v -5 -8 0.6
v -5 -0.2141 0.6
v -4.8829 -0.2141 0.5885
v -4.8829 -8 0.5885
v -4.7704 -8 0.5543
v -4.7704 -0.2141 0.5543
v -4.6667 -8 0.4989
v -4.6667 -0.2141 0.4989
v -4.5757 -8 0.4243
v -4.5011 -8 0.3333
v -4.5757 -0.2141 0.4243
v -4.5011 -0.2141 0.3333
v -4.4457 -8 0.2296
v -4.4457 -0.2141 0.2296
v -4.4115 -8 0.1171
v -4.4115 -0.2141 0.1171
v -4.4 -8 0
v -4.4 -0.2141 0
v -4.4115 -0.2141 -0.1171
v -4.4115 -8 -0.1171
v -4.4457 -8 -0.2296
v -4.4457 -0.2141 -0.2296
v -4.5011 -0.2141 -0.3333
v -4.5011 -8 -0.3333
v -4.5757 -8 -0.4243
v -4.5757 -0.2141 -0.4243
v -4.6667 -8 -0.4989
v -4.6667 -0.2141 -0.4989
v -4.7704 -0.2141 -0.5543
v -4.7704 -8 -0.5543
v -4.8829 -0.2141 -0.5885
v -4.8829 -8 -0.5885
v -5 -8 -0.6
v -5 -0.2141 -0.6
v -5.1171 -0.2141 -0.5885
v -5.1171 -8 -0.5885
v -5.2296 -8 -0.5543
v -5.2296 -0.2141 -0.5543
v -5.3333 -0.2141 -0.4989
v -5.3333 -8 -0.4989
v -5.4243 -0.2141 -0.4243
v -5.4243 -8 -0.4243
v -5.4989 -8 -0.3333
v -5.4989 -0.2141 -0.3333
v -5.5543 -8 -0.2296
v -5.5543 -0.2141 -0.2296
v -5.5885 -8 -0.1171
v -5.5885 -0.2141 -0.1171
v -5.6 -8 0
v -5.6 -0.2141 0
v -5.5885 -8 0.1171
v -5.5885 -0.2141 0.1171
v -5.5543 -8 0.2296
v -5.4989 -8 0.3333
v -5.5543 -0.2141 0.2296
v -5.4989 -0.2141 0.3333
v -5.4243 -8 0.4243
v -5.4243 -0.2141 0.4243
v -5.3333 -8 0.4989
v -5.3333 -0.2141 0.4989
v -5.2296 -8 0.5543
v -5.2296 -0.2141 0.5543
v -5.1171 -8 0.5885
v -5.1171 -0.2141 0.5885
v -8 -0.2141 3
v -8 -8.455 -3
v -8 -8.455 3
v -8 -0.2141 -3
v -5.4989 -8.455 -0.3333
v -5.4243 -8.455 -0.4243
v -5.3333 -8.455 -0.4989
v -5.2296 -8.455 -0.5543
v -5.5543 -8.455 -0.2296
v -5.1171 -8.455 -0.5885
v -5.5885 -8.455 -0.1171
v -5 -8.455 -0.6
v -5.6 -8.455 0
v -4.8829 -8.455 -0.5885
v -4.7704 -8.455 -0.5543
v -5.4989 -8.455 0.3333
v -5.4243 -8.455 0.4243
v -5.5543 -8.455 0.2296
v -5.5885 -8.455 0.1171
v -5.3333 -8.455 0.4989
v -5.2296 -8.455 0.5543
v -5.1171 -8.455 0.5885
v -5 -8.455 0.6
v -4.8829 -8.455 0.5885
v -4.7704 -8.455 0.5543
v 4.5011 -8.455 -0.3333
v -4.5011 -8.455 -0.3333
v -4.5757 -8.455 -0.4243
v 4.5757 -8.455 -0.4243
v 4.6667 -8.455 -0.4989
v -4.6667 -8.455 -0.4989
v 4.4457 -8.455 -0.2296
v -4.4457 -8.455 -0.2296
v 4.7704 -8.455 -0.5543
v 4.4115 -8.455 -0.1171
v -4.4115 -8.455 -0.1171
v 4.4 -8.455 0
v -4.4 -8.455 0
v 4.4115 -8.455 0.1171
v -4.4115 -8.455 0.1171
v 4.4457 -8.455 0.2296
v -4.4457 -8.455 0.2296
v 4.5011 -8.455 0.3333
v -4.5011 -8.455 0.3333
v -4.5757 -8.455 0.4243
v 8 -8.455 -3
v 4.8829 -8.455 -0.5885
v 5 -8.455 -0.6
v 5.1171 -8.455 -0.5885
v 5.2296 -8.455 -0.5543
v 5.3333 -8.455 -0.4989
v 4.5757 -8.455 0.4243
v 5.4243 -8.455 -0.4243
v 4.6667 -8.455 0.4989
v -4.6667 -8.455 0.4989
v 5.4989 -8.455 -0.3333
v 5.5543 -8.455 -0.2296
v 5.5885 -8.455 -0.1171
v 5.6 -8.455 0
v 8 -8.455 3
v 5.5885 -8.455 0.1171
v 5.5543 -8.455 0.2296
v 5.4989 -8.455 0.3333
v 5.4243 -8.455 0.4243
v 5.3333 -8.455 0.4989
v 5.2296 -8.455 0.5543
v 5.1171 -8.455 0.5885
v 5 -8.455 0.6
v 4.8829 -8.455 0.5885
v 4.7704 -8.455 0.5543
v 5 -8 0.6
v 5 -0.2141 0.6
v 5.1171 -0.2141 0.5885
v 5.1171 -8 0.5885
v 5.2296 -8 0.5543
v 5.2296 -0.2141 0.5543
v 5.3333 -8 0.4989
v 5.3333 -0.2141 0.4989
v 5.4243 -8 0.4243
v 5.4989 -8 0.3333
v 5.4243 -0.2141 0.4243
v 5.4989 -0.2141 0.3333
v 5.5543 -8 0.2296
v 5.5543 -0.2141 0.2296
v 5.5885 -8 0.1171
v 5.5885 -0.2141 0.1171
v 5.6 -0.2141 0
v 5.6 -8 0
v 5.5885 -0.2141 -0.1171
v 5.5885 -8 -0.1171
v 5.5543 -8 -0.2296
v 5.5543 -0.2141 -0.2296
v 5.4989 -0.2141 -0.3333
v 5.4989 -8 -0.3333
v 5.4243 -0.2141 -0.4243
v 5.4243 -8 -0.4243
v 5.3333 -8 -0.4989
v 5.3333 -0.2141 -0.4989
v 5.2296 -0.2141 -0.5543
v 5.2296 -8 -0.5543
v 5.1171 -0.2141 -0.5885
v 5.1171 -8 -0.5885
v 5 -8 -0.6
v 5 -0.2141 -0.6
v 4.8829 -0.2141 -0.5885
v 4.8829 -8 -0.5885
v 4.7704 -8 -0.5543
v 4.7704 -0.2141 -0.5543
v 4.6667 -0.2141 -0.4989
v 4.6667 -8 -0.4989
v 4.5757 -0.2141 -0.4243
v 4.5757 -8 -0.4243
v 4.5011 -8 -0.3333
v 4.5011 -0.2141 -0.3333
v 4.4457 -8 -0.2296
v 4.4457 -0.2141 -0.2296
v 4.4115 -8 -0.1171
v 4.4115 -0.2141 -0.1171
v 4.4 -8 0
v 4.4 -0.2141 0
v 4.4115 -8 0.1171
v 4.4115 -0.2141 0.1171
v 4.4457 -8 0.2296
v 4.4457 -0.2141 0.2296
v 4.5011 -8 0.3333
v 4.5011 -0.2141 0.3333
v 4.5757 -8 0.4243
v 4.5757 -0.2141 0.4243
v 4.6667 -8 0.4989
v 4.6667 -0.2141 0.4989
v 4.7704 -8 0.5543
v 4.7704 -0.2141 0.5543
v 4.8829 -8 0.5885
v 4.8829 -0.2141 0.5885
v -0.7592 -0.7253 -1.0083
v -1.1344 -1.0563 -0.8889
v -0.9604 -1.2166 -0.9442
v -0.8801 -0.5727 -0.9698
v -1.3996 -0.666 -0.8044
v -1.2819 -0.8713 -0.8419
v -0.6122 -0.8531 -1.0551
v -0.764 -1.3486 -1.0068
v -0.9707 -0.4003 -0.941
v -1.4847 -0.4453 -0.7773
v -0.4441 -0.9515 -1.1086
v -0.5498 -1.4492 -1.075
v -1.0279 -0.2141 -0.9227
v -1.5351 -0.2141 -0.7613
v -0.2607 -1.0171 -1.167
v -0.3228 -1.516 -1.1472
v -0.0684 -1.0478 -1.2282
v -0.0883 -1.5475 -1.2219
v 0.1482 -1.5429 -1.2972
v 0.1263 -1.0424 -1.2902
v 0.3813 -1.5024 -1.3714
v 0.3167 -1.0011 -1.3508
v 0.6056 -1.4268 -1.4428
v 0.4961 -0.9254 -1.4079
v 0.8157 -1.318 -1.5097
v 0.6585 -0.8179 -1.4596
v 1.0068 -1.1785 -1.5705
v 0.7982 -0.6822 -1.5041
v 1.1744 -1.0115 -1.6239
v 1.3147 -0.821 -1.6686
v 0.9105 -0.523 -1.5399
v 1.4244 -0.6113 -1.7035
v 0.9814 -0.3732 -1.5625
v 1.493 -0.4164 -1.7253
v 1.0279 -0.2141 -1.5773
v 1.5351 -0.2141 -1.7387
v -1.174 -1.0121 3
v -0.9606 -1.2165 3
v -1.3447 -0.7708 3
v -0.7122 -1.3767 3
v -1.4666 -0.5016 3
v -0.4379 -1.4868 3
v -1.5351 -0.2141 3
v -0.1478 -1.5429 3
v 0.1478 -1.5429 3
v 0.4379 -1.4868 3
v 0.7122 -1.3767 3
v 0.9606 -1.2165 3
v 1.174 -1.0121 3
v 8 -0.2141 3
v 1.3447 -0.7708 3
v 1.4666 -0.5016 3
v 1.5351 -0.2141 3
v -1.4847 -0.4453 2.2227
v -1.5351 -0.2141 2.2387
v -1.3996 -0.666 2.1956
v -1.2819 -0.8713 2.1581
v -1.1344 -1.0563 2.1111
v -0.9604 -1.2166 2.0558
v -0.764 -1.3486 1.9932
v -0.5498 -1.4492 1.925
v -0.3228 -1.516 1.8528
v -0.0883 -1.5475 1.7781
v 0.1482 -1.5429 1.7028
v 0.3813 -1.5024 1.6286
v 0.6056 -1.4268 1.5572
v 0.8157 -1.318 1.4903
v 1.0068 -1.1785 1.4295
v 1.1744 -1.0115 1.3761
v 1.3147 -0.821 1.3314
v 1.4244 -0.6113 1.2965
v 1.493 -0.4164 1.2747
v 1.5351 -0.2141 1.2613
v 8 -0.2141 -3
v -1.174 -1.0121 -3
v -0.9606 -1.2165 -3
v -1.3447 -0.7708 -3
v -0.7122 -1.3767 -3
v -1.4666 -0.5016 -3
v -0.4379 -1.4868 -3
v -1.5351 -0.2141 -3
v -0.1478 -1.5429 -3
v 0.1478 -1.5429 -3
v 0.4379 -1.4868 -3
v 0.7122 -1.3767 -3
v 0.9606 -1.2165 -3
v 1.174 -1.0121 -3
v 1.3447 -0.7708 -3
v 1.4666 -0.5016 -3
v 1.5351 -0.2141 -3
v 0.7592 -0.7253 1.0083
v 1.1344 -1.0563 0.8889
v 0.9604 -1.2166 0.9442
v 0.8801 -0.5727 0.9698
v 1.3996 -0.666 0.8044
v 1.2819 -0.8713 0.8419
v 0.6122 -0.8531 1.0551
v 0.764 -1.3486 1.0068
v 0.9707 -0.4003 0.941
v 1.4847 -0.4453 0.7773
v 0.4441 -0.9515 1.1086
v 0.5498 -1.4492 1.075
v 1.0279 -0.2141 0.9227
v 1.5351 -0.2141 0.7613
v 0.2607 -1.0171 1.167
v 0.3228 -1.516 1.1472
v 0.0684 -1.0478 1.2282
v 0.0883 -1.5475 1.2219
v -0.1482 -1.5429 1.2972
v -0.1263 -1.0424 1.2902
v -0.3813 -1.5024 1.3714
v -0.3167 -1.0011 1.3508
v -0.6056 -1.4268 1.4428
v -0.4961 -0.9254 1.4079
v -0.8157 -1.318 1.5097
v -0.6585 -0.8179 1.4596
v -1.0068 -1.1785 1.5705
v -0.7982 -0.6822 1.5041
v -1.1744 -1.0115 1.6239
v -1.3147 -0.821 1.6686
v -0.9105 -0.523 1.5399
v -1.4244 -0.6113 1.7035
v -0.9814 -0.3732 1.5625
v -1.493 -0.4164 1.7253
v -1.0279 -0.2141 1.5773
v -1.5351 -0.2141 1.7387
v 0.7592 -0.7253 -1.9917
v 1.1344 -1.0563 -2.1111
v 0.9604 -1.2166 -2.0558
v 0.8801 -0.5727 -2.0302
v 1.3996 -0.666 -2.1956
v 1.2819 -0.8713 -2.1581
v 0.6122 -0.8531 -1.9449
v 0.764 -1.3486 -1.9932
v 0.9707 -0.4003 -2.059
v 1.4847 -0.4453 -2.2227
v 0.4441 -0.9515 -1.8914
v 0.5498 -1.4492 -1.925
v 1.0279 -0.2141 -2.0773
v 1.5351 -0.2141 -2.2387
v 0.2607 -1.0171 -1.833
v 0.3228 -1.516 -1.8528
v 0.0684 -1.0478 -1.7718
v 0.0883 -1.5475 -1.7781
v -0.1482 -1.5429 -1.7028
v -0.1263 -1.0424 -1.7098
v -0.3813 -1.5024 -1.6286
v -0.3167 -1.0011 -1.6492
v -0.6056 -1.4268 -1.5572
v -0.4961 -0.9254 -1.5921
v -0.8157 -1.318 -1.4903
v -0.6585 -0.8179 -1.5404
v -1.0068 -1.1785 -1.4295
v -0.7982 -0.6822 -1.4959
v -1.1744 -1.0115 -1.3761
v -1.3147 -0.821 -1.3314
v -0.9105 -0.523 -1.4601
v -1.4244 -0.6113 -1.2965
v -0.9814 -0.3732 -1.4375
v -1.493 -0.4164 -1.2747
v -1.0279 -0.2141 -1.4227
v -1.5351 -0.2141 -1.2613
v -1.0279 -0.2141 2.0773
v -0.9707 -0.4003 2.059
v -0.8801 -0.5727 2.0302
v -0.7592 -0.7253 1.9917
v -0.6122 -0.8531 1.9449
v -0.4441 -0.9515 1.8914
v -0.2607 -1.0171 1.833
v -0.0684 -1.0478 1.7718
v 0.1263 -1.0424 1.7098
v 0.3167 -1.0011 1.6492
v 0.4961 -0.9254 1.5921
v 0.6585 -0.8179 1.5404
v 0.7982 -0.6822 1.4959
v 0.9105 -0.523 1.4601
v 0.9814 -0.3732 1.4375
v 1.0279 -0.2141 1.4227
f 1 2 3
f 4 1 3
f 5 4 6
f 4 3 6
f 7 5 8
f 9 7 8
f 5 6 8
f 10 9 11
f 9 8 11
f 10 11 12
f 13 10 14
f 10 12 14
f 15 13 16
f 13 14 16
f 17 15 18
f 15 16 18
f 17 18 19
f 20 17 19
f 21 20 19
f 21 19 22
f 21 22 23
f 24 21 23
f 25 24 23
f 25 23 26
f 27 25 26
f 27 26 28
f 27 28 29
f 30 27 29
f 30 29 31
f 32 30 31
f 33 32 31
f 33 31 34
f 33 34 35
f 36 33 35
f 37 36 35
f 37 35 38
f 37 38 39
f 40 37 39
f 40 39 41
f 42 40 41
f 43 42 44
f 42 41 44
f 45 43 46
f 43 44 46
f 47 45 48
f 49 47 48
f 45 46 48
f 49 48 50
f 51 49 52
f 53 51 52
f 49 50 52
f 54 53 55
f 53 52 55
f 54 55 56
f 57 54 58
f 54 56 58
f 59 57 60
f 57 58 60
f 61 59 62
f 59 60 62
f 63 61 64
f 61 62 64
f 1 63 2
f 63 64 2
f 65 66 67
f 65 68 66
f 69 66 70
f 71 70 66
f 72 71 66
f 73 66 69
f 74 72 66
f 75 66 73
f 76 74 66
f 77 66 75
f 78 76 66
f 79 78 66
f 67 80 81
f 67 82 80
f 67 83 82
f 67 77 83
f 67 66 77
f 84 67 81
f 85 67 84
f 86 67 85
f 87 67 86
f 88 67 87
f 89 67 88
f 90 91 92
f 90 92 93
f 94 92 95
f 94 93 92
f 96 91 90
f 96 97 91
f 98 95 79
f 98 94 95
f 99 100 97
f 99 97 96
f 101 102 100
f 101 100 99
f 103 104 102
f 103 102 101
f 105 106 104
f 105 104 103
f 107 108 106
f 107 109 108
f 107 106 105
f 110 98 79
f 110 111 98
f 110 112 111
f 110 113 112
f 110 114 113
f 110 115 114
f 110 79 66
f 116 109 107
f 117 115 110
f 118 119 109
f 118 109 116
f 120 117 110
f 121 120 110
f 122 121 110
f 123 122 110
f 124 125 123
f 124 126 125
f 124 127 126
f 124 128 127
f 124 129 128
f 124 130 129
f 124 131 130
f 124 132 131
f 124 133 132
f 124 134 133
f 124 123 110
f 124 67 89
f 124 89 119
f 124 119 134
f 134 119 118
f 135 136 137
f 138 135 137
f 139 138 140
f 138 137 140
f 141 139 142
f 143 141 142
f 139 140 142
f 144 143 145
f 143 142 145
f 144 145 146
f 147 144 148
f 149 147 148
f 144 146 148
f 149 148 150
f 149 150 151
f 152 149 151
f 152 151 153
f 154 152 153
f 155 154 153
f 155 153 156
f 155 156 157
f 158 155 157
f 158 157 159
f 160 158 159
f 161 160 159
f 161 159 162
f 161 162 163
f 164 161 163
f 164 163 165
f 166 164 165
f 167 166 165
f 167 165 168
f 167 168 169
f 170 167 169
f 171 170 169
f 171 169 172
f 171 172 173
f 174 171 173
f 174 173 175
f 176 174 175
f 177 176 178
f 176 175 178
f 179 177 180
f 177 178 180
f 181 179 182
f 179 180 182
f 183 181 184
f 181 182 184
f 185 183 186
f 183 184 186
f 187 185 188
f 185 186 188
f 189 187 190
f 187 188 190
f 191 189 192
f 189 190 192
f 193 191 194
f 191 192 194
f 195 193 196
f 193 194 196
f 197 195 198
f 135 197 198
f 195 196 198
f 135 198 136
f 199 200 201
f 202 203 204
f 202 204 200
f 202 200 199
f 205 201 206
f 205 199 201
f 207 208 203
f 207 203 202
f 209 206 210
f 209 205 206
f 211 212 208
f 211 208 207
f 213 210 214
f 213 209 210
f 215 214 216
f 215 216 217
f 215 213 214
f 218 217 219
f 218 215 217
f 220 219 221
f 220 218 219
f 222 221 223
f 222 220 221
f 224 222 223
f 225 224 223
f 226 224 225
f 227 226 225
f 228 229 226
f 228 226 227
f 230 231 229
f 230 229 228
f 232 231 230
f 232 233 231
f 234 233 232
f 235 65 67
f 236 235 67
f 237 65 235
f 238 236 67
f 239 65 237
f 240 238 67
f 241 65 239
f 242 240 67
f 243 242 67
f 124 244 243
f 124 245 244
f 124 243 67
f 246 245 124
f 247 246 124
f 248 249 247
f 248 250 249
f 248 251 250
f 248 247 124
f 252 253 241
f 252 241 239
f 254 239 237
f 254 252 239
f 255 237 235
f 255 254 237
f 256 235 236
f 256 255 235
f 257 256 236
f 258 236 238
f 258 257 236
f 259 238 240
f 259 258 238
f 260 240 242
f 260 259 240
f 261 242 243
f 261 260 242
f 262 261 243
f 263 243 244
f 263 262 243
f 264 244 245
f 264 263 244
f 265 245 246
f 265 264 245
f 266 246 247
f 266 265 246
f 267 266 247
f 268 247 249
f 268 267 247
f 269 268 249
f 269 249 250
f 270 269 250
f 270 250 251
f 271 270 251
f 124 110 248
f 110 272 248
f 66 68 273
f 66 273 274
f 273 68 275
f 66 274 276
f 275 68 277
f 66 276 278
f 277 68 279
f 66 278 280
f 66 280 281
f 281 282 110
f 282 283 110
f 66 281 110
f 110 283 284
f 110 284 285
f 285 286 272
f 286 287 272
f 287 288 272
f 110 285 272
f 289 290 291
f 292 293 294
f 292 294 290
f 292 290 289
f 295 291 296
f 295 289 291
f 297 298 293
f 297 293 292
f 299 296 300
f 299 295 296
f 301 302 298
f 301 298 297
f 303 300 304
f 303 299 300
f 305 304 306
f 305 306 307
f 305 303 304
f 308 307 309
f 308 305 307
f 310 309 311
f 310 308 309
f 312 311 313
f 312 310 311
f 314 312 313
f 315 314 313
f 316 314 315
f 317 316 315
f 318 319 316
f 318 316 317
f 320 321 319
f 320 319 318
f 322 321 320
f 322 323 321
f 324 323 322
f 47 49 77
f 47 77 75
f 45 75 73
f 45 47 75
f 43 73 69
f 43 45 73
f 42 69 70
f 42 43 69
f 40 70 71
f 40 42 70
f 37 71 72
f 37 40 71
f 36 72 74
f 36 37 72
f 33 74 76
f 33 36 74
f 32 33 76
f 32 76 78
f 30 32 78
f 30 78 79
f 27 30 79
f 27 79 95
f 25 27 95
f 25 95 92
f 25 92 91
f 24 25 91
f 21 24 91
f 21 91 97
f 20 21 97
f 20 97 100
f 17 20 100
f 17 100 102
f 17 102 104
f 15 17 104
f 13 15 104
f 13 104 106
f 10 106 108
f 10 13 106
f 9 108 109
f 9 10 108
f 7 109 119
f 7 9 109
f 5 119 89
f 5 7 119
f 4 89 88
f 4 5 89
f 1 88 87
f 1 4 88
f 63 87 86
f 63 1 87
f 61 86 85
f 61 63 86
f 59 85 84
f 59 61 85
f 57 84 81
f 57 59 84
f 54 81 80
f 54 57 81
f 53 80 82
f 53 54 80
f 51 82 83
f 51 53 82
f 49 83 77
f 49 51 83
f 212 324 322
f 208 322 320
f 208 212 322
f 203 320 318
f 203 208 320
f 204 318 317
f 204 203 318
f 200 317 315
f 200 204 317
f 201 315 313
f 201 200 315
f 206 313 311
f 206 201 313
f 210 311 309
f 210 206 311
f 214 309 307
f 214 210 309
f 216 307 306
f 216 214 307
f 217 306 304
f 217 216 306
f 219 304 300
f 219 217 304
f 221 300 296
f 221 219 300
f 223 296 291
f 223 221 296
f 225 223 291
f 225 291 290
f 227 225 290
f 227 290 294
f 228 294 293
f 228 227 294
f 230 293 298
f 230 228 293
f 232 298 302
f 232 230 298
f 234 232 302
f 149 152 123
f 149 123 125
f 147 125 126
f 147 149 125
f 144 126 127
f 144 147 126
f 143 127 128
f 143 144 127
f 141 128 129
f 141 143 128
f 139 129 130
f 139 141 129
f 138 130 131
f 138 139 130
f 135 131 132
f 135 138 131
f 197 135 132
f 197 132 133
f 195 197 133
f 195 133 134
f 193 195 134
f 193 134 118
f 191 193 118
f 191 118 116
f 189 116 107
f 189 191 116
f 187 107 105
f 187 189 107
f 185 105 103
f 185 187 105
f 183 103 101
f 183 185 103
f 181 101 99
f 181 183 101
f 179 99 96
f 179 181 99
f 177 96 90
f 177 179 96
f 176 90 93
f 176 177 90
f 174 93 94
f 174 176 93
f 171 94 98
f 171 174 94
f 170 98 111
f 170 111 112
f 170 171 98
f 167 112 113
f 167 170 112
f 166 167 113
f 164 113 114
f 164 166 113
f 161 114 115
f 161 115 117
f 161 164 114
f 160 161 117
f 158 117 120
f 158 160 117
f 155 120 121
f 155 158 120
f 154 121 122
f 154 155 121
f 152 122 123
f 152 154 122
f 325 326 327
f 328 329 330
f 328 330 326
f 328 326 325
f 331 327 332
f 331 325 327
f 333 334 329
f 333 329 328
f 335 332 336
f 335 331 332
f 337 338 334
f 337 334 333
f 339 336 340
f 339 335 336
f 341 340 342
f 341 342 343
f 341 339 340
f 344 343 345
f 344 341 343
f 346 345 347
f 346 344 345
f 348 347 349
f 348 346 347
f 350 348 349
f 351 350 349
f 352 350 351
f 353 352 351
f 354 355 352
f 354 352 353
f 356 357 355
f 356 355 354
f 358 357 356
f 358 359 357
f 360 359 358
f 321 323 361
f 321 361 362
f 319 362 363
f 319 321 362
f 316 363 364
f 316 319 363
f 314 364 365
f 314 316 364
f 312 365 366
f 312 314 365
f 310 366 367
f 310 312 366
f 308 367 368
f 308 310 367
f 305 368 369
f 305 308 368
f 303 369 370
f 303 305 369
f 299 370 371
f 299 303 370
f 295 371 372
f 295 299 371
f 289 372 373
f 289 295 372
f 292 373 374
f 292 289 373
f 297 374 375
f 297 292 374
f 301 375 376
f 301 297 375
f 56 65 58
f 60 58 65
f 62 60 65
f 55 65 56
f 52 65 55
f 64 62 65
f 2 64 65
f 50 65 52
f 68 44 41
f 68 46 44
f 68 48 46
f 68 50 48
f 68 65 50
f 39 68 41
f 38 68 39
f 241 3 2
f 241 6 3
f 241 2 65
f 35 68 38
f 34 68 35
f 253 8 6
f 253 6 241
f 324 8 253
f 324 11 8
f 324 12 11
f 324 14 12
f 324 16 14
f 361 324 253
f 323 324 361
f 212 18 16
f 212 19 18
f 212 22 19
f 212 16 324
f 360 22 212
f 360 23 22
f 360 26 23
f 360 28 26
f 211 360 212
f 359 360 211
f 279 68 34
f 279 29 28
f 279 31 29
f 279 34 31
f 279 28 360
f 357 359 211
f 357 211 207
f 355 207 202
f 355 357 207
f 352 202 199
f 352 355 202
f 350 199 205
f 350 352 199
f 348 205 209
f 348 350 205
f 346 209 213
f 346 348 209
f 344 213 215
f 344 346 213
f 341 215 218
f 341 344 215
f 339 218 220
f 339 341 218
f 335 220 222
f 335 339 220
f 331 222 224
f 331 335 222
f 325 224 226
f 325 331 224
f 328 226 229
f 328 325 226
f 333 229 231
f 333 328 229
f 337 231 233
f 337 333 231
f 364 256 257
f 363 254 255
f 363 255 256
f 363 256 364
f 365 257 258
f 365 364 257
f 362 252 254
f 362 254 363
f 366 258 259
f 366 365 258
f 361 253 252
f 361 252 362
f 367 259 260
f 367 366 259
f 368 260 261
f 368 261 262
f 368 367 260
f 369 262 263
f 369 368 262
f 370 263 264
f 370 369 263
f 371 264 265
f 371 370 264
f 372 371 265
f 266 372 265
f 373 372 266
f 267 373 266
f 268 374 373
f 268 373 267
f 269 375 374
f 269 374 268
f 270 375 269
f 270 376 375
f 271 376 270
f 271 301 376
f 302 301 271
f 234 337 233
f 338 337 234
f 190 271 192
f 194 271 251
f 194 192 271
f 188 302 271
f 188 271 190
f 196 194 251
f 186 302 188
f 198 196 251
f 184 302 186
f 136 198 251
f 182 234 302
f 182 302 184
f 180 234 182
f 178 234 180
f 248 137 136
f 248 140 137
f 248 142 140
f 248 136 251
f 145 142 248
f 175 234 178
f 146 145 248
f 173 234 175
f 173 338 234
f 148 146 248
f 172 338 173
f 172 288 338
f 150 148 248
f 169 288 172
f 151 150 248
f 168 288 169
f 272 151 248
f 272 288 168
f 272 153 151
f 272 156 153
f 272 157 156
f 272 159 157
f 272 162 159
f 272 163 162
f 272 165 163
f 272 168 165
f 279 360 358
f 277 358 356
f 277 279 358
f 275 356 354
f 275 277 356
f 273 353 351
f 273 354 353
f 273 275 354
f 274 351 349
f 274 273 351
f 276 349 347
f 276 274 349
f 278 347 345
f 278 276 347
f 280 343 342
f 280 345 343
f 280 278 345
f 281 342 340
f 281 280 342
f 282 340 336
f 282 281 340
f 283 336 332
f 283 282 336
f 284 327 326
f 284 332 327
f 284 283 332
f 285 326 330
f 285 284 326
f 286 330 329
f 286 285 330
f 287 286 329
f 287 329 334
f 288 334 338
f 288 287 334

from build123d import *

# Parameters (mm, degrees)
SKETCH_1_W               = 16
SKETCH_1_H               = 16
SKETCH_1_R               = 1.55
EXTRUDE_1_DEPTH          = 3
EXTRUDE_2_DEPTH          = 8
CUT_EXTRUDE_2_DEPTH      = 12.704699911
CUT_EXTRUDE_2_DEPTH_BACK = 12.704699911
SKETCH_8_R               = 0.6
CUT_EXTRUDE_3_DEPTH      = 12.704699911
SKETCH_9_W               = 16
SKETCH_9_H               = 6
SKETCH_9_R               = 0.6
EXTRUDE_3_DEPTH          = 0.455


with BuildPart() as part:
    # 草图1 → 凸台-拉伸1 (new, symmetric)
    with BuildSketch(Plane.XY):
        Rectangle(SKETCH_1_W, SKETCH_1_H)
        Circle(SKETCH_1_R, mode=Mode.SUBTRACT)
    extrude(amount=EXTRUDE_1_DEPTH, both=True)

    # 草图6 → 凸台-拉伸2 (add)
    with BuildSketch(Plane(origin=(0, 0, 0), x_dir=(1, 0, 0), z_dir=(0, 1, 0))):
        Polygon((-1.55, -1.743476048), (-1.55, -2.243476048), (1.55, -1.256523952), (1.55, -0.756523952), align=None)
        Polygon((-1.55, 1.256523952), (-1.55, 0.756523952), (1.55, 1.743476048), (1.55, 2.243476048), align=None)
    extrude(amount=-EXTRUDE_2_DEPTH)

    # 草图7 → 切除-拉伸2 (cut, two sides: drawn at the far end of the back side and taken through both)
    with BuildSketch(Plane.XY.offset(-CUT_EXTRUDE_2_DEPTH_BACK)):
        with BuildLine():
            Line((-8, -0.214092961), (-1.027941732, -0.214092961))
            ThreePointArc((-1.027941732, -0.214092961), (-0.107613153, 1.044470875), (1.05, 0))
            ThreePointArc((1.05, 0), (1.044470875, -0.107613153), (1.027941732, -0.214092961))
            Line((1.027941732, -0.214092961), (8, -0.214092961))
            Line((8, -0.214092961), (8, 8))
            Line((8, 8), (-8, 8))
            Line((-8, 8), (-8, -0.214092961))
        make_face()
        with BuildLine():
            Line((1.027941732, -0.214092961), (0, 0))
            Line((0, 0), (-1.027941732, -0.214092961))
            ThreePointArc((-1.027941732, -0.214092961), (0, -1.05), (1.027941732, -0.214092961))
        make_face()
        with BuildLine():
            Line((-1.027941732, -0.214092961), (0, 0))
            Line((0, 0), (1.027941732, -0.214092961))
            ThreePointArc((1.027941732, -0.214092961), (1.044470875, -0.107613153), (1.05, 0))
            ThreePointArc((1.05, 0), (-0.107613153, 1.044470875), (-1.027941732, -0.214092961))
        make_face()
    extrude(amount=CUT_EXTRUDE_2_DEPTH + CUT_EXTRUDE_2_DEPTH_BACK, mode=Mode.SUBTRACT)

    # 草图8 → 切除-拉伸3 (cut, through all)
    with BuildSketch(Plane(origin=(0, 0, 0), x_dir=(1, 0, 0), z_dir=(0, 1, 0))):
        with Locations(Location((-5, 0, 0), (0, 0, 270))):
            Circle(SKETCH_8_R)
        with Locations(Location((5, 0, 0), (0, 0, 270))):
            Circle(SKETCH_8_R)
    extrude(amount=-CUT_EXTRUDE_3_DEPTH, mode=Mode.SUBTRACT)

    # 草图9 → 凸台-拉伸3 (add)
    with BuildSketch(Plane.XZ.offset(8)):
        Rectangle(SKETCH_9_W, SKETCH_9_H)
        with Locations(Location((-5, 0, 0), (0, 0, 180))):
            Circle(SKETCH_9_R, mode=Mode.SUBTRACT)
        with Locations((5, 0)):
            Circle(SKETCH_9_R, mode=Mode.SUBTRACT)
    extrude(amount=EXTRUDE_3_DEPTH)


solid = part.part
